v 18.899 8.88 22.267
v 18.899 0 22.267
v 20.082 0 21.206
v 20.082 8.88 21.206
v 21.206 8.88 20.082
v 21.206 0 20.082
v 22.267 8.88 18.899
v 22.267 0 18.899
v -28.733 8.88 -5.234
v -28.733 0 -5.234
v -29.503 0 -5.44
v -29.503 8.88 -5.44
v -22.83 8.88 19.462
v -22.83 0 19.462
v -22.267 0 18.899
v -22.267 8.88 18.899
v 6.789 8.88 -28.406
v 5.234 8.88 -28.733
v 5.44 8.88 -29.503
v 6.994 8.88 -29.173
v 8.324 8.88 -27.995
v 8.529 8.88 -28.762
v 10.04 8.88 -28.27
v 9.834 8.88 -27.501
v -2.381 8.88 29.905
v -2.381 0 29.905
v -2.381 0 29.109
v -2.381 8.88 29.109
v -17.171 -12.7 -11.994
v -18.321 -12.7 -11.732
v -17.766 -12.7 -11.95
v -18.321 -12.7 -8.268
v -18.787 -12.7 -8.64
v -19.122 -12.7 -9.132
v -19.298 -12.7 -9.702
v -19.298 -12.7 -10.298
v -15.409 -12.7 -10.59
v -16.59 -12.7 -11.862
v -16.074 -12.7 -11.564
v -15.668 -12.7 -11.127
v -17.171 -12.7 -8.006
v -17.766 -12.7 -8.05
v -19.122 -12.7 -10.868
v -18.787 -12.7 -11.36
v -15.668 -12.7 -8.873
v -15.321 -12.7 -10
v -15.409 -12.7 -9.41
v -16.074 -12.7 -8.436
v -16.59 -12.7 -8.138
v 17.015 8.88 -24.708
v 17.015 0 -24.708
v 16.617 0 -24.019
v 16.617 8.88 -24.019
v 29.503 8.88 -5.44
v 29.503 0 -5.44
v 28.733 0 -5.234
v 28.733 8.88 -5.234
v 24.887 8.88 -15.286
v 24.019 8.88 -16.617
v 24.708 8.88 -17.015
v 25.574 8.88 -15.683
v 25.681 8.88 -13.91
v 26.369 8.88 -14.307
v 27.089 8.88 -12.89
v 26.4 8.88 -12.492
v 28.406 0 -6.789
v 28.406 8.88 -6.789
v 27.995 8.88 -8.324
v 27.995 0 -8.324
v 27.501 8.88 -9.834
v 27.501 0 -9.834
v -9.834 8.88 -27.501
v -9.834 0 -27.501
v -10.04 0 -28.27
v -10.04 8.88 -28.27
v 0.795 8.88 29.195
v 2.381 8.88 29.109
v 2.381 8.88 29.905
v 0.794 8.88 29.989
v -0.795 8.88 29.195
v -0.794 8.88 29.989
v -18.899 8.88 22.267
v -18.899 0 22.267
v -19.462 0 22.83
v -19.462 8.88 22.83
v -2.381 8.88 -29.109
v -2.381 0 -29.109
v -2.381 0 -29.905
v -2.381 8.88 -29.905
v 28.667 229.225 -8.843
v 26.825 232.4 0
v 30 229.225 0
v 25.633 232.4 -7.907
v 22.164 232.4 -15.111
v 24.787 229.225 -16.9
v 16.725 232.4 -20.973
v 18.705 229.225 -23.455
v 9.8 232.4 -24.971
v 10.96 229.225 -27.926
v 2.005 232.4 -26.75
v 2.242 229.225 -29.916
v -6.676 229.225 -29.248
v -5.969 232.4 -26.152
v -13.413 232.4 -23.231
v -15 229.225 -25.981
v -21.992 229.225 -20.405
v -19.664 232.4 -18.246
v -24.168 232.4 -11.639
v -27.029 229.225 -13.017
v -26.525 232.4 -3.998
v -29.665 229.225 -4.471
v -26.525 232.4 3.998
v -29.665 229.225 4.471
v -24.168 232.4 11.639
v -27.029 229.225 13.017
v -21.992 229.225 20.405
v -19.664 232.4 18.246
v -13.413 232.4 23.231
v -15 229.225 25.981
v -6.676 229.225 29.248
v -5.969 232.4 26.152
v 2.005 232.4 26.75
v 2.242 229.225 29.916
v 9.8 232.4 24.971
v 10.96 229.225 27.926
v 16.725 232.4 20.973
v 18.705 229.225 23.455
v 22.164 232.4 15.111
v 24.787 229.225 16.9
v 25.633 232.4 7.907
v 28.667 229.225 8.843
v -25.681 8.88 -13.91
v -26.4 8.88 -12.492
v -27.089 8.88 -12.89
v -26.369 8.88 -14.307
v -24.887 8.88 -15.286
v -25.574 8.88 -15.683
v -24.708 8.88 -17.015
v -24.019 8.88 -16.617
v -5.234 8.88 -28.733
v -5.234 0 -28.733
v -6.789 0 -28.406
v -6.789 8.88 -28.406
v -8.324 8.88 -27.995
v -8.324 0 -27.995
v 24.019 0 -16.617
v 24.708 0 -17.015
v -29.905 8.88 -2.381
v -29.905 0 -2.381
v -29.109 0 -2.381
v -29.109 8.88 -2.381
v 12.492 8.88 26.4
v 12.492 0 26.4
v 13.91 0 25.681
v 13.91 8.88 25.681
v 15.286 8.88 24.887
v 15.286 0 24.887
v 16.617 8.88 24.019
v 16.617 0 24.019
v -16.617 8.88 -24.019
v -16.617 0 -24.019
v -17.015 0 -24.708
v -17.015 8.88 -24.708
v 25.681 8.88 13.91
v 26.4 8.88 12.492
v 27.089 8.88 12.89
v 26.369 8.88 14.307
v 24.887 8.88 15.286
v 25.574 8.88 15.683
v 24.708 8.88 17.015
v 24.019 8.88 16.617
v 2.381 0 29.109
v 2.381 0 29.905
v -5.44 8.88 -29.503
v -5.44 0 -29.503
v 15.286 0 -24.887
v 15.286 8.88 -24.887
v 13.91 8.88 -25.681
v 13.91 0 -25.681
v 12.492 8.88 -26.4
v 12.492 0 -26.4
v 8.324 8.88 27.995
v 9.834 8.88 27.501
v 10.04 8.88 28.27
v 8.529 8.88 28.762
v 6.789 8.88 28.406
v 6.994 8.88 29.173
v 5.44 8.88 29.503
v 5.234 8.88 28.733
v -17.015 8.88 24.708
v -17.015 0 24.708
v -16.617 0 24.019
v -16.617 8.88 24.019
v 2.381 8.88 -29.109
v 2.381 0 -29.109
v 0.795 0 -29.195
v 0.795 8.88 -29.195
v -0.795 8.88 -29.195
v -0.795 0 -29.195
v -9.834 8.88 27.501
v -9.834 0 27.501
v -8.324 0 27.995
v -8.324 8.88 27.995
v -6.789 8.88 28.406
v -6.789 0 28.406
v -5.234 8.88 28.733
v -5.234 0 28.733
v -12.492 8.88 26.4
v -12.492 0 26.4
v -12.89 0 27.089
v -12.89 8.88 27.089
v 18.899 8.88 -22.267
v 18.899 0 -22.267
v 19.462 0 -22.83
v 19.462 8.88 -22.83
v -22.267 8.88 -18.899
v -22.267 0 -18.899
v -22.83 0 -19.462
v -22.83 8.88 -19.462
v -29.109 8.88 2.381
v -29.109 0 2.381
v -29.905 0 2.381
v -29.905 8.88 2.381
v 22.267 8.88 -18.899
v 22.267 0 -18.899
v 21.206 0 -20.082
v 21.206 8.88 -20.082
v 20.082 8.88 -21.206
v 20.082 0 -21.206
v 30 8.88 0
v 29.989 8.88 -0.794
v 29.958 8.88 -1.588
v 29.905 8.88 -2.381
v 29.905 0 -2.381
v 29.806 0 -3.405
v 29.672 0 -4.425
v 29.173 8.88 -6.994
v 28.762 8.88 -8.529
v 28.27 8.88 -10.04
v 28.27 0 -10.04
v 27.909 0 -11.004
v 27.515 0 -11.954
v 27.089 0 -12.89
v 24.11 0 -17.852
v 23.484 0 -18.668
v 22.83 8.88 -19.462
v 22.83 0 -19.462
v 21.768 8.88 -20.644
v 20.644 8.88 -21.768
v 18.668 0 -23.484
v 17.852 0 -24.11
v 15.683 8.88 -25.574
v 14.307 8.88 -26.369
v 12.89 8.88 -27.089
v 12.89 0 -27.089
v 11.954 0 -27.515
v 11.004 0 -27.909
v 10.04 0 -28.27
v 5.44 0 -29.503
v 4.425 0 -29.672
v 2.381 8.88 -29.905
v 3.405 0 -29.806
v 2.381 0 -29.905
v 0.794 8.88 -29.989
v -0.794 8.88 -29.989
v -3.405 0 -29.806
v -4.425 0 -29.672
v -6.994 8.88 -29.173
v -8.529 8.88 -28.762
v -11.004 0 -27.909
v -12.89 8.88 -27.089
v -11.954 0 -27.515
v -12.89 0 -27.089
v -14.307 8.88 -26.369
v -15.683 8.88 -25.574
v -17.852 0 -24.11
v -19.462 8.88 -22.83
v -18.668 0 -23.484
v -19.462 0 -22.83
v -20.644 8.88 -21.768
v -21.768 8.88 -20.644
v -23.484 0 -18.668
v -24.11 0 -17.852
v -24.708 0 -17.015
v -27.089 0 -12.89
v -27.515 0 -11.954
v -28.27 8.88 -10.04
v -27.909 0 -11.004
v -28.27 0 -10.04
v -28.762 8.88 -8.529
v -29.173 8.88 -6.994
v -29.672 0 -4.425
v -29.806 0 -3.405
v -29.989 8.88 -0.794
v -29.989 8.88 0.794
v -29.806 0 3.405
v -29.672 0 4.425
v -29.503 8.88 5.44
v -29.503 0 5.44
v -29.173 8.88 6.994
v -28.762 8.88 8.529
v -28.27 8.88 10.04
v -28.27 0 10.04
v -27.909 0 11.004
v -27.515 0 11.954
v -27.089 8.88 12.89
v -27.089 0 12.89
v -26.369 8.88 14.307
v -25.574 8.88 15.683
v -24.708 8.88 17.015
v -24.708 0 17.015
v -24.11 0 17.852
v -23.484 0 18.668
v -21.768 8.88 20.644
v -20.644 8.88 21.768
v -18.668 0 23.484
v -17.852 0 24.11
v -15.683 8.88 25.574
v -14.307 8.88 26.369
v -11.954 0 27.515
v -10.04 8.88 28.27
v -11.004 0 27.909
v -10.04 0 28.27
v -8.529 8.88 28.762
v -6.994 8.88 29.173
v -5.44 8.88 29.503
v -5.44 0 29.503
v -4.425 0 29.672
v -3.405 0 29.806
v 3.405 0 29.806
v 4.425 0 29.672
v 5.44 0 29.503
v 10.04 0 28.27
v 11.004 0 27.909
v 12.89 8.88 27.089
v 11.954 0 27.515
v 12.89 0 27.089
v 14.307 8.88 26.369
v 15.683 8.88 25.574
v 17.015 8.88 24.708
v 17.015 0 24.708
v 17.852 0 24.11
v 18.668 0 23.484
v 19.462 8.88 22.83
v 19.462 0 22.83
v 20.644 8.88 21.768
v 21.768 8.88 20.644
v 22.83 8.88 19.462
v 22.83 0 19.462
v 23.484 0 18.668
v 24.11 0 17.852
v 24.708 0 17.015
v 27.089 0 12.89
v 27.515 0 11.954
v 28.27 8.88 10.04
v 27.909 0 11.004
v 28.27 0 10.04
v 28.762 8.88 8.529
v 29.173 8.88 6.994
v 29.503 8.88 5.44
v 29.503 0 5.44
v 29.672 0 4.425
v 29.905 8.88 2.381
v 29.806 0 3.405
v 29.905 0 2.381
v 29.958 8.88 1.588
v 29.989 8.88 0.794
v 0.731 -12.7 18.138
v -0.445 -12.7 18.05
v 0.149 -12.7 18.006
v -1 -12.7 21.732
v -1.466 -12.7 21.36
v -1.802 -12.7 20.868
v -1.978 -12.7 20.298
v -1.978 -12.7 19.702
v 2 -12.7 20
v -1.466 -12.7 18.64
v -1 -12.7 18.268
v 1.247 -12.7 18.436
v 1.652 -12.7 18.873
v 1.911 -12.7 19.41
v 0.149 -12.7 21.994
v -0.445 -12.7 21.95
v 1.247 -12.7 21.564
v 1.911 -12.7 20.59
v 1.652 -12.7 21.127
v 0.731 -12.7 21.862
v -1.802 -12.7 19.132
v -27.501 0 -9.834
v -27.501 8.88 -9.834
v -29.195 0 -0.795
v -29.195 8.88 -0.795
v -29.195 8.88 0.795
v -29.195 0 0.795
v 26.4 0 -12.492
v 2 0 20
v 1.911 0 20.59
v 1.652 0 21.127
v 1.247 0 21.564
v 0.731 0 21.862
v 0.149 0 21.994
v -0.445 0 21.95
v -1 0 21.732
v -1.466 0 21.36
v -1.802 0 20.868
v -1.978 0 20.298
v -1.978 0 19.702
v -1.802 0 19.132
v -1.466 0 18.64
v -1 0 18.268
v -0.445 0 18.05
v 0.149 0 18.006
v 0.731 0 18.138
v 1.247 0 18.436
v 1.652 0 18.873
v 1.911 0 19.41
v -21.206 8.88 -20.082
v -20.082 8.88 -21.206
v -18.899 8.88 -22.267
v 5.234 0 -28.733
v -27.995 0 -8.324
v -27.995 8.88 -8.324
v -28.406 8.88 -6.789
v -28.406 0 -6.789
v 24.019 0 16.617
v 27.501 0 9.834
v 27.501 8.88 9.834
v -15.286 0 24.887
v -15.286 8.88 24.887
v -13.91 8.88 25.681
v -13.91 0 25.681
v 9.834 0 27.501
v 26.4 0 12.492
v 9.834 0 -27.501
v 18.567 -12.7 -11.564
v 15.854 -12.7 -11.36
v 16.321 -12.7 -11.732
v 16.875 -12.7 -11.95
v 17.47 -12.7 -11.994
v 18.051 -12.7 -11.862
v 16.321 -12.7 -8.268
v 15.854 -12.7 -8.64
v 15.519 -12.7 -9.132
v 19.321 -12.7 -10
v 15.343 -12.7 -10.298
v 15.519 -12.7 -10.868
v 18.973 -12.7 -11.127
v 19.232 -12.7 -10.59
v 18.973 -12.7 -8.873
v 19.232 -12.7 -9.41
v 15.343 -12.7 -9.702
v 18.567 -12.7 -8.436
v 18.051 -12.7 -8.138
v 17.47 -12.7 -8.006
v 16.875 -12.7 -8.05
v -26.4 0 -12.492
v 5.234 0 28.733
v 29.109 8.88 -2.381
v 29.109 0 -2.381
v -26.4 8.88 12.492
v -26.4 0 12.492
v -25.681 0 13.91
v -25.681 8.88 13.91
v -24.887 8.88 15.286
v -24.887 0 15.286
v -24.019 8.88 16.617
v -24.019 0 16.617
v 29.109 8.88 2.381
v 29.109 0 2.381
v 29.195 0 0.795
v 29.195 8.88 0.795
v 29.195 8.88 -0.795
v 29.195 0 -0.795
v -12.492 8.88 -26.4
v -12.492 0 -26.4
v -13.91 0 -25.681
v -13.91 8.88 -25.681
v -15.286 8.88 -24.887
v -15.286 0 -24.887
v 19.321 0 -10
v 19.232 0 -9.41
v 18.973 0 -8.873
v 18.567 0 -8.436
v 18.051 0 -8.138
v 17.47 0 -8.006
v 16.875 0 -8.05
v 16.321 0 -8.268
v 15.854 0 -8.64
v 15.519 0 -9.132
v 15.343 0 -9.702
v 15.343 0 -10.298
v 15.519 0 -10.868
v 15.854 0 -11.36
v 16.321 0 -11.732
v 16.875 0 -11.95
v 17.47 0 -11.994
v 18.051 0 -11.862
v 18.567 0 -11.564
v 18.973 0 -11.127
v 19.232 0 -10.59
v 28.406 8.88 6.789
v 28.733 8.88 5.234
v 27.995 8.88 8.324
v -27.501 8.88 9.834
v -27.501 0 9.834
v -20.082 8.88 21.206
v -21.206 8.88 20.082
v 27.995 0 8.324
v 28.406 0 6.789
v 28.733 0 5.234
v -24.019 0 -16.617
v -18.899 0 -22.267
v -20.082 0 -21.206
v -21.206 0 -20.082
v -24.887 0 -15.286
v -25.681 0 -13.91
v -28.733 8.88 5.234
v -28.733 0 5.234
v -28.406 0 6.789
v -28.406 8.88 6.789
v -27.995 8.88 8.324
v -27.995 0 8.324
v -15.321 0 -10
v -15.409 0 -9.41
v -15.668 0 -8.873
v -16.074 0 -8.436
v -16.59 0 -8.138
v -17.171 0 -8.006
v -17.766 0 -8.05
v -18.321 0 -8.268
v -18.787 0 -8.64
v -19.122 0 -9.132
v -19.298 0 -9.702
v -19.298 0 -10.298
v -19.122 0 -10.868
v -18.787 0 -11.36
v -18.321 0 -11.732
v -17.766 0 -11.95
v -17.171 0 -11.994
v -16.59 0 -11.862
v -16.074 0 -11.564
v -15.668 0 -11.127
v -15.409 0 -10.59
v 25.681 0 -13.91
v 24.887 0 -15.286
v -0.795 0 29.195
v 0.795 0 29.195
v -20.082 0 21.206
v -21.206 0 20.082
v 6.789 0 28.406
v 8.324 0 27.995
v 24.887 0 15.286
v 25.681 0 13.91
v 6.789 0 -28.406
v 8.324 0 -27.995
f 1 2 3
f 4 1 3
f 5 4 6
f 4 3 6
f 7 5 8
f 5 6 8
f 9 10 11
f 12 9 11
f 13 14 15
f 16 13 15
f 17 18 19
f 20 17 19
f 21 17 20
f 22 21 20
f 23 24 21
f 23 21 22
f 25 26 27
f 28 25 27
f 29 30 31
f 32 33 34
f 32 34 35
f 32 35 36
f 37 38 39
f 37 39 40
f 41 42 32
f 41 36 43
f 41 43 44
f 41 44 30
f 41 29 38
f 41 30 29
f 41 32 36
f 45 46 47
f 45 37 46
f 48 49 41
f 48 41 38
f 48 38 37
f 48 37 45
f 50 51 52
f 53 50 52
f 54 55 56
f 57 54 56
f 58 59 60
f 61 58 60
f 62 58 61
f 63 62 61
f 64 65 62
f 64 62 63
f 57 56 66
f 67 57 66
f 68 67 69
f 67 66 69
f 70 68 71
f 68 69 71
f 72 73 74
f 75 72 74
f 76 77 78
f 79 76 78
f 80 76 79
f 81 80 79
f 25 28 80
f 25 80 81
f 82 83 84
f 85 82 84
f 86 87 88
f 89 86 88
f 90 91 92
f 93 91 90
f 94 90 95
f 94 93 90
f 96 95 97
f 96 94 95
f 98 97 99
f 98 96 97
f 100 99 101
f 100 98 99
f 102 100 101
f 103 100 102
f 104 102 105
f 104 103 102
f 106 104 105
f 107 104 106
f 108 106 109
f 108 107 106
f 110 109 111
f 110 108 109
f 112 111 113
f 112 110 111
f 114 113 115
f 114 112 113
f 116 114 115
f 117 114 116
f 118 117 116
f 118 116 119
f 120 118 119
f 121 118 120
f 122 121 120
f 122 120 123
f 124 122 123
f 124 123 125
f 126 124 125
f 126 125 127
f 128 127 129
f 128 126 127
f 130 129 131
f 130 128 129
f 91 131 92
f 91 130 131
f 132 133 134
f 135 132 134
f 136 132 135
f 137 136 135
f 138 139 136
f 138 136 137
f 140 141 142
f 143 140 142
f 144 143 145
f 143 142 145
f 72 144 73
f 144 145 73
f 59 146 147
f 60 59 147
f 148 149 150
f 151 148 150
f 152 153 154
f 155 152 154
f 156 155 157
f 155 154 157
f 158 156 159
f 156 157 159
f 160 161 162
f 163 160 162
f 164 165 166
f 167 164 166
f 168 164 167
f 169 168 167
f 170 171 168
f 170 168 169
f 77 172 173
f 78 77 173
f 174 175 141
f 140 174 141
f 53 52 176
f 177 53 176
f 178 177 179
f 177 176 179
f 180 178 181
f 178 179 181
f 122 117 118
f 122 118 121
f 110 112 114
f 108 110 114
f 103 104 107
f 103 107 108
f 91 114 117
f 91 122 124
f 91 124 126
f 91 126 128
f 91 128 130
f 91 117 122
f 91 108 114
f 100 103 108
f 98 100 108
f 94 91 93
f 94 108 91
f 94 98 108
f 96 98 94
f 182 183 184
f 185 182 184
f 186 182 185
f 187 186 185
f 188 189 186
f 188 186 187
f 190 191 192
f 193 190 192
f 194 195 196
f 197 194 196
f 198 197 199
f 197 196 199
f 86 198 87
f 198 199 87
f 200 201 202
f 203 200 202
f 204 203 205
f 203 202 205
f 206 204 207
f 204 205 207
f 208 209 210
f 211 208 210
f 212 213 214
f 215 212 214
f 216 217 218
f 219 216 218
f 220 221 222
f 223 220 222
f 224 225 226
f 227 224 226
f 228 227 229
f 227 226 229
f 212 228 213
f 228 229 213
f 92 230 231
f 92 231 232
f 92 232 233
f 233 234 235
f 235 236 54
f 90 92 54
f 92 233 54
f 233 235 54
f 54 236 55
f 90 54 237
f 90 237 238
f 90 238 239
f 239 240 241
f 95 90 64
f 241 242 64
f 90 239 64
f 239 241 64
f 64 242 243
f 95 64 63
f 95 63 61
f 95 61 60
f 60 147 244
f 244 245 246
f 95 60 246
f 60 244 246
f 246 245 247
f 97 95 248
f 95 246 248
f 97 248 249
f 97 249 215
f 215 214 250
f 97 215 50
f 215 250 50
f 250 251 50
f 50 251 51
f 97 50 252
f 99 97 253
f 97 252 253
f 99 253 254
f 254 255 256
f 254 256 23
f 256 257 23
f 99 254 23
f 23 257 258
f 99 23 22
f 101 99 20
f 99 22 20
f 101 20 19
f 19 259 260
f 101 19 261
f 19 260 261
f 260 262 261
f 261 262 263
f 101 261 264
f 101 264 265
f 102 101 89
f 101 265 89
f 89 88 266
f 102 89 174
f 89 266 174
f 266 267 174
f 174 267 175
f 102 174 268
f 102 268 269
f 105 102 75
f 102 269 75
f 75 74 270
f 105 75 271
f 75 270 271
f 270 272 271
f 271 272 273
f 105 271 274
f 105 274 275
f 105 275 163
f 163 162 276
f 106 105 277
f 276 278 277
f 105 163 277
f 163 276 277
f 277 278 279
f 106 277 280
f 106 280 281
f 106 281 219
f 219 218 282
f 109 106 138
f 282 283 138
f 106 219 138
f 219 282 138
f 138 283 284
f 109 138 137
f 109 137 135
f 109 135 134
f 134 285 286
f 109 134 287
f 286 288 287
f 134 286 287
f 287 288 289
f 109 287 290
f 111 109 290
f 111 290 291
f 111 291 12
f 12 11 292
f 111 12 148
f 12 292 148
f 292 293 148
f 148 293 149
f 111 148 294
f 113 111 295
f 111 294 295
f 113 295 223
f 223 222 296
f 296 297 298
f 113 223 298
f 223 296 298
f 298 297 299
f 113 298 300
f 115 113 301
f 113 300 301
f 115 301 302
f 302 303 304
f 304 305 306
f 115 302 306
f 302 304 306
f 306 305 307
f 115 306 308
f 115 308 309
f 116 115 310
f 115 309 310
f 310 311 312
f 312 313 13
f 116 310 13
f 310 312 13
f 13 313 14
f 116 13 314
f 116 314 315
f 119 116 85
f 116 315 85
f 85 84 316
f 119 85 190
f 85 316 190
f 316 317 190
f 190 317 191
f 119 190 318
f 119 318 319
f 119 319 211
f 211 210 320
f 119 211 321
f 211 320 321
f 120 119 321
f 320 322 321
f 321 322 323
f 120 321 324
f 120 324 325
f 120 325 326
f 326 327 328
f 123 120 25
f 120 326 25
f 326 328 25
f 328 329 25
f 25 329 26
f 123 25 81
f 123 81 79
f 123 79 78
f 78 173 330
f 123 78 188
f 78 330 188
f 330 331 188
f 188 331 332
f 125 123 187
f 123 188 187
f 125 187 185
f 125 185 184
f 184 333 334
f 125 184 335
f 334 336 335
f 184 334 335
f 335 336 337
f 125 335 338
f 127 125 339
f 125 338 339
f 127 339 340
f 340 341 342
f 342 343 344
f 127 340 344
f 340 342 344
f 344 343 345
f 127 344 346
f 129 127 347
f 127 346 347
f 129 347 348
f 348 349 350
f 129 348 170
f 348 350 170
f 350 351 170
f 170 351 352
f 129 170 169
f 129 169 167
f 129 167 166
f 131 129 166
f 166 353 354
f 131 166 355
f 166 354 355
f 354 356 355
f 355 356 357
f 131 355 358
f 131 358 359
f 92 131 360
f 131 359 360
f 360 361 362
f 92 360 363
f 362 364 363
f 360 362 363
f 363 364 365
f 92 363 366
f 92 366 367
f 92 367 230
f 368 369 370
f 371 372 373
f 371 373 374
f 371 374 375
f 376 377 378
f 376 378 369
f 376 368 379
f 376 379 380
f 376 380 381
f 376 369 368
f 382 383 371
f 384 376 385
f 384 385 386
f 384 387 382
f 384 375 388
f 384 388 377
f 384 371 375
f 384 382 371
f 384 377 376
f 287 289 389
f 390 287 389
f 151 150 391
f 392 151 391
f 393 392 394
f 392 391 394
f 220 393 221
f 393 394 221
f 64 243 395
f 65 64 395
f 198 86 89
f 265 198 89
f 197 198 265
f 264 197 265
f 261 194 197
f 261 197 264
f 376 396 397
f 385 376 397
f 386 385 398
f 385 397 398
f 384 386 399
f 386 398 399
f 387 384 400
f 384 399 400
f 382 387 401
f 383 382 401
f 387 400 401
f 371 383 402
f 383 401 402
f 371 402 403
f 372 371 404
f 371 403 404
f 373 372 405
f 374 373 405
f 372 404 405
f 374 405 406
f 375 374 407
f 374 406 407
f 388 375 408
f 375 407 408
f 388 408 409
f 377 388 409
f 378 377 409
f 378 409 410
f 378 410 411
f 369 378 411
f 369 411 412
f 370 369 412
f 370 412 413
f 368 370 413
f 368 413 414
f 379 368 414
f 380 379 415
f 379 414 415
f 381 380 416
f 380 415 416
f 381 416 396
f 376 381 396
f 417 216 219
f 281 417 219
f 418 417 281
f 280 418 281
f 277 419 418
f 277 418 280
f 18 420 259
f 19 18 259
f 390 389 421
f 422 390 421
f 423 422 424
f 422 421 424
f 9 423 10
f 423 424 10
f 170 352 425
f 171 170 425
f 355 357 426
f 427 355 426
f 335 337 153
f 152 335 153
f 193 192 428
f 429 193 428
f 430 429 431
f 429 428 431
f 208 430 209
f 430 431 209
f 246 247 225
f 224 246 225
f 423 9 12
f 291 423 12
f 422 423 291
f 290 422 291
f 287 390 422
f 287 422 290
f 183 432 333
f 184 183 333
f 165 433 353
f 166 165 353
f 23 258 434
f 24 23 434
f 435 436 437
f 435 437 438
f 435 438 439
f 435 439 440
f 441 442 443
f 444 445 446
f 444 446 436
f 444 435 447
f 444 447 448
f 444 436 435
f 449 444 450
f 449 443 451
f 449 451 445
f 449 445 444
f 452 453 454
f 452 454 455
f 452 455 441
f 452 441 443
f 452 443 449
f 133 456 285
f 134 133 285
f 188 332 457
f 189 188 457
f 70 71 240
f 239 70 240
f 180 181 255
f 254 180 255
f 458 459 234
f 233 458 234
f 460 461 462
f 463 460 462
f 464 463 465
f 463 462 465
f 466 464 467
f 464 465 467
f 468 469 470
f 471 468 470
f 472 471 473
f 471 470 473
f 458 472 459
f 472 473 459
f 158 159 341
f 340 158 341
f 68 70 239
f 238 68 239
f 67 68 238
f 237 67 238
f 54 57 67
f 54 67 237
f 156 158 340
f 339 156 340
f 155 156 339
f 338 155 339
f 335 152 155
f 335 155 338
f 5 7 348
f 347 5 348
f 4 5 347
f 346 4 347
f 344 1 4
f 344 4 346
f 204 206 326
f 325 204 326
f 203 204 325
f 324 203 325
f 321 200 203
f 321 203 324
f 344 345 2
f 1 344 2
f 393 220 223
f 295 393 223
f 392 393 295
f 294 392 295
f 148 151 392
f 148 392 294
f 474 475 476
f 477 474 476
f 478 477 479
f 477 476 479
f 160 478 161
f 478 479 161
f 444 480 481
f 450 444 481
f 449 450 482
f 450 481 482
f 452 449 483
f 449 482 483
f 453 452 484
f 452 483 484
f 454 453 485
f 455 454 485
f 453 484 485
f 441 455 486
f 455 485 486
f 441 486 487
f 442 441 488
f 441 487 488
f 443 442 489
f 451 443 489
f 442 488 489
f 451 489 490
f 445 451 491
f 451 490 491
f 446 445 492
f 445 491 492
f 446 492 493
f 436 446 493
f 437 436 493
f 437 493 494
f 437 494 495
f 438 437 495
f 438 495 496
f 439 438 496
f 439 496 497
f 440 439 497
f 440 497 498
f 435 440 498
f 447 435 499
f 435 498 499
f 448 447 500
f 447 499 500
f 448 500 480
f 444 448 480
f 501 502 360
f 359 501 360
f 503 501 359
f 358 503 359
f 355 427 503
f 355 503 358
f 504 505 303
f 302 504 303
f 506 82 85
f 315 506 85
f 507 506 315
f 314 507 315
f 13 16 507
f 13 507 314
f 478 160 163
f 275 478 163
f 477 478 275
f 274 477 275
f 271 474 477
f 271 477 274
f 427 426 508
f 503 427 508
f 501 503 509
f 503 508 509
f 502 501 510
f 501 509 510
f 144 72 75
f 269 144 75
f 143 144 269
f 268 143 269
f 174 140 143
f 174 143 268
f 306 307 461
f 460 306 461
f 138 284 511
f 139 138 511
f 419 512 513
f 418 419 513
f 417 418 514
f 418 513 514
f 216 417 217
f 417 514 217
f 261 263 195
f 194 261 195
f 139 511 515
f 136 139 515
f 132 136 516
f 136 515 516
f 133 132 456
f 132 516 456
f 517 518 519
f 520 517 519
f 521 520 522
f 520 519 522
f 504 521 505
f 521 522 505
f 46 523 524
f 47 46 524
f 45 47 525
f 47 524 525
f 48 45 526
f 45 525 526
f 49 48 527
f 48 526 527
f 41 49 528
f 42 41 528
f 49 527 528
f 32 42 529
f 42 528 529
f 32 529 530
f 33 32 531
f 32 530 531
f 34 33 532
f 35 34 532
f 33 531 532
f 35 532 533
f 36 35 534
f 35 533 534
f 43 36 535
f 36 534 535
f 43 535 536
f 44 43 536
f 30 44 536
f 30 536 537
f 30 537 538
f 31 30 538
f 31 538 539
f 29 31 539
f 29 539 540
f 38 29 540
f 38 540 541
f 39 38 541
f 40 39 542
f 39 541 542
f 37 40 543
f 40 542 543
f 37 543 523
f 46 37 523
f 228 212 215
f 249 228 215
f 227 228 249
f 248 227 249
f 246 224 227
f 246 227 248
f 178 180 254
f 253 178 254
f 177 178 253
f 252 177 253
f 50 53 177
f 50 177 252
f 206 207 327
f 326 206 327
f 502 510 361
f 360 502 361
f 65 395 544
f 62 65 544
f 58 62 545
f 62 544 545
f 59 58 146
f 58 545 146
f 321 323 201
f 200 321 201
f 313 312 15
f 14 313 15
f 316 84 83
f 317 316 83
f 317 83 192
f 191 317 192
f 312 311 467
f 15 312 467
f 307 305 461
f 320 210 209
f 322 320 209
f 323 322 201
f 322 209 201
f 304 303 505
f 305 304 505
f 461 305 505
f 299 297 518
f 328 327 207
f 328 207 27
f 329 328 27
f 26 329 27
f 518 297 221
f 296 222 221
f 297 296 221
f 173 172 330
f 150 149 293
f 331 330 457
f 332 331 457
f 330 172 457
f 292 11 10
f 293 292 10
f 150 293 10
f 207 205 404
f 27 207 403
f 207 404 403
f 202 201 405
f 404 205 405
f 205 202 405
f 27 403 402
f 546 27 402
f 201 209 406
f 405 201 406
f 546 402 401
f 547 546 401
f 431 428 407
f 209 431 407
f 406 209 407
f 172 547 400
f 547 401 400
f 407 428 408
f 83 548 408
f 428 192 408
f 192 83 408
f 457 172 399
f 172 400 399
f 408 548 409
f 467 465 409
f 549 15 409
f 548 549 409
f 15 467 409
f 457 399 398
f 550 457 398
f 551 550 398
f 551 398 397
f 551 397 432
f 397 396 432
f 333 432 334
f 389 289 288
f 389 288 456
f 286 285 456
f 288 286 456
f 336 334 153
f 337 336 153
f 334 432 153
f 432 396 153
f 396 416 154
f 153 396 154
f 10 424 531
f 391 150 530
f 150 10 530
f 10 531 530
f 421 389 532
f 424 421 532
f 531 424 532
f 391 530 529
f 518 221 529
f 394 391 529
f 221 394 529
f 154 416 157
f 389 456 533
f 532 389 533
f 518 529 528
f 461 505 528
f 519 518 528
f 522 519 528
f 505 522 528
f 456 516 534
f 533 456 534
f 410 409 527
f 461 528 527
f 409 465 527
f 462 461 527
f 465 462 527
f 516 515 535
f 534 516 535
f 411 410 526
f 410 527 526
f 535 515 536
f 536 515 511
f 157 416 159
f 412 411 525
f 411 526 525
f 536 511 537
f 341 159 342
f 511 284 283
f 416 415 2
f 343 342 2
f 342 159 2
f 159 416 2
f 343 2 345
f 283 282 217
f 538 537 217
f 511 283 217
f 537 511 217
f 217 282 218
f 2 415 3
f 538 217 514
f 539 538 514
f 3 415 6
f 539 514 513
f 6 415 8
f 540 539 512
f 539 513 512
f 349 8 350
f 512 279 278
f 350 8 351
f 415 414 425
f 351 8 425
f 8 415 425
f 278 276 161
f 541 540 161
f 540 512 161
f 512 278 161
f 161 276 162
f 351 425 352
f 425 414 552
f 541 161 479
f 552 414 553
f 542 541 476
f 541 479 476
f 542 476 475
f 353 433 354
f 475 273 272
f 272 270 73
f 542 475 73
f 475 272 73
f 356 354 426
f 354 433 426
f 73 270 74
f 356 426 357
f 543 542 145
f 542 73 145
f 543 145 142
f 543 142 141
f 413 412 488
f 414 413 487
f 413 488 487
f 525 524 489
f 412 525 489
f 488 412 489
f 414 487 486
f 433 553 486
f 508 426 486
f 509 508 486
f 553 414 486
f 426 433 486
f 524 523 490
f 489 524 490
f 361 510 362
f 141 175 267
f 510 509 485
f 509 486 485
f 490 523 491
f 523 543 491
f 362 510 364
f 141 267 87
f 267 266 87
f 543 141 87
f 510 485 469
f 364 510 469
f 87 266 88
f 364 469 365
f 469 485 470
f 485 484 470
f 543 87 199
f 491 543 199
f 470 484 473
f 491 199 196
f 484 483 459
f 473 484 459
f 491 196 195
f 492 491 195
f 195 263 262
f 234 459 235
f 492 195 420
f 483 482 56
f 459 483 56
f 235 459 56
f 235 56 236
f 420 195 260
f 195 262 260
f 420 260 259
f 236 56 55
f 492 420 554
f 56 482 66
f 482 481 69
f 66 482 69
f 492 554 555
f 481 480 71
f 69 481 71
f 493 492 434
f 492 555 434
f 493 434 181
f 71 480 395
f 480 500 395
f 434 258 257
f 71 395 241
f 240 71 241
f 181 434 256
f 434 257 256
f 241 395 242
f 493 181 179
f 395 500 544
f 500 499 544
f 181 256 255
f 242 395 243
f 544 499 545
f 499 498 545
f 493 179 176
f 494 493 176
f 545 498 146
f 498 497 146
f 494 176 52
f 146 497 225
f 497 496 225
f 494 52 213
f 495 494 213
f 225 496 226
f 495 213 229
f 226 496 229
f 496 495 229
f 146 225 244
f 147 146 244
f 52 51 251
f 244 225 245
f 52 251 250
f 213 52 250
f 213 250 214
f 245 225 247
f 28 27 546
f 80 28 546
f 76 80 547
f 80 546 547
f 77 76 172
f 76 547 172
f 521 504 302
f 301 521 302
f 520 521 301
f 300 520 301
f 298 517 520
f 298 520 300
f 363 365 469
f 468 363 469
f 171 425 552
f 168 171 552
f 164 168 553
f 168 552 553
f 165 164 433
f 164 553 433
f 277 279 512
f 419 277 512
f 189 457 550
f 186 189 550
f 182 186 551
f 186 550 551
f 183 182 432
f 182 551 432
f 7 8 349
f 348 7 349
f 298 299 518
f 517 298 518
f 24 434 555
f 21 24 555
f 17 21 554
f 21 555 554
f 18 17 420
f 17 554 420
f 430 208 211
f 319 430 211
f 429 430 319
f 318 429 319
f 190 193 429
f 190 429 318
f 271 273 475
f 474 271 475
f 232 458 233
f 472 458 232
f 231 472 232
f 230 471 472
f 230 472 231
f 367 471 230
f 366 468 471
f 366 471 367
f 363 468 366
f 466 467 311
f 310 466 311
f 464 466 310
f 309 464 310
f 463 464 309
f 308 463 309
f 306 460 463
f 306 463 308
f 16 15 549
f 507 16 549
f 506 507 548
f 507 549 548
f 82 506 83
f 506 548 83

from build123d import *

# Parameters (mm, degrees)
SKETCH1_R          = 30
EXTRUDE1_DEPTH     = 232.4
CHAMFER1_SIZE      = 3.175
CUT_EXTRUDE1_DEPTH = 8.88
CIRPATTERN3_COUNT  = 24
SKETCH8_R          = 2
EXTRUDE2_DEPTH     = 12.7


with BuildPart() as part:
    # Sketch1 → Extrude1 (new body)
    with BuildSketch(Plane(origin=(0, 0, 0), x_dir=(1, 0, 0), z_dir=(0, 1, 0))):
        Circle(SKETCH1_R)
    extrude(amount=EXTRUDE1_DEPTH)

    # Chamfer1
    chamfer1_edges = [part.edges().sort_by_distance(p)[0] for p in [
        (-30, 232.4, 0),
    ]]
    chamfer(chamfer1_edges, length=CHAMFER1_SIZE)

    # Sketch7 → Cut-Extrude1 (cut)
    with BuildSketch(Plane.XZ):
        with BuildLine():
            Line((29.905344814, 2.38125), (29.109013853, 2.38125))
            ThreePointArc((29.109013853, 2.38125), (29.20625, 0), (29.109013853, -2.38125))
            Line((29.109013853, -2.38125), (29.905344814, -2.38125))
            ThreePointArc((29.905344814, -2.38125), (30, 0), (29.905344814, 2.38125))
        make_face()
    cut_extrude1 = extrude(amount=-CUT_EXTRUDE1_DEPTH, mode=Mode.SUBTRACT)

    # CirPattern3: Cut-Extrude1 ×24 about axis
    cirpattern3_axis = Axis((0, 0, 0), (0, 1, 0))
    for i in range(1, CIRPATTERN3_COUNT):
        add(cut_extrude1.rotate(cirpattern3_axis, i * 360 / CIRPATTERN3_COUNT), mode=Mode.SUBTRACT)

    # Sketch8 → Extrude2 (add)
    with BuildSketch(Plane.XZ):
        with Locations((0, 20)):
            Circle(SKETCH8_R)
        with Locations((17.320508076, -10)):
            Circle(SKETCH8_R)
        with Locations((-17.320508076, -10)):
            Circle(SKETCH8_R)
    extrude(amount=EXTRUDE2_DEPTH)


solid = part.part
